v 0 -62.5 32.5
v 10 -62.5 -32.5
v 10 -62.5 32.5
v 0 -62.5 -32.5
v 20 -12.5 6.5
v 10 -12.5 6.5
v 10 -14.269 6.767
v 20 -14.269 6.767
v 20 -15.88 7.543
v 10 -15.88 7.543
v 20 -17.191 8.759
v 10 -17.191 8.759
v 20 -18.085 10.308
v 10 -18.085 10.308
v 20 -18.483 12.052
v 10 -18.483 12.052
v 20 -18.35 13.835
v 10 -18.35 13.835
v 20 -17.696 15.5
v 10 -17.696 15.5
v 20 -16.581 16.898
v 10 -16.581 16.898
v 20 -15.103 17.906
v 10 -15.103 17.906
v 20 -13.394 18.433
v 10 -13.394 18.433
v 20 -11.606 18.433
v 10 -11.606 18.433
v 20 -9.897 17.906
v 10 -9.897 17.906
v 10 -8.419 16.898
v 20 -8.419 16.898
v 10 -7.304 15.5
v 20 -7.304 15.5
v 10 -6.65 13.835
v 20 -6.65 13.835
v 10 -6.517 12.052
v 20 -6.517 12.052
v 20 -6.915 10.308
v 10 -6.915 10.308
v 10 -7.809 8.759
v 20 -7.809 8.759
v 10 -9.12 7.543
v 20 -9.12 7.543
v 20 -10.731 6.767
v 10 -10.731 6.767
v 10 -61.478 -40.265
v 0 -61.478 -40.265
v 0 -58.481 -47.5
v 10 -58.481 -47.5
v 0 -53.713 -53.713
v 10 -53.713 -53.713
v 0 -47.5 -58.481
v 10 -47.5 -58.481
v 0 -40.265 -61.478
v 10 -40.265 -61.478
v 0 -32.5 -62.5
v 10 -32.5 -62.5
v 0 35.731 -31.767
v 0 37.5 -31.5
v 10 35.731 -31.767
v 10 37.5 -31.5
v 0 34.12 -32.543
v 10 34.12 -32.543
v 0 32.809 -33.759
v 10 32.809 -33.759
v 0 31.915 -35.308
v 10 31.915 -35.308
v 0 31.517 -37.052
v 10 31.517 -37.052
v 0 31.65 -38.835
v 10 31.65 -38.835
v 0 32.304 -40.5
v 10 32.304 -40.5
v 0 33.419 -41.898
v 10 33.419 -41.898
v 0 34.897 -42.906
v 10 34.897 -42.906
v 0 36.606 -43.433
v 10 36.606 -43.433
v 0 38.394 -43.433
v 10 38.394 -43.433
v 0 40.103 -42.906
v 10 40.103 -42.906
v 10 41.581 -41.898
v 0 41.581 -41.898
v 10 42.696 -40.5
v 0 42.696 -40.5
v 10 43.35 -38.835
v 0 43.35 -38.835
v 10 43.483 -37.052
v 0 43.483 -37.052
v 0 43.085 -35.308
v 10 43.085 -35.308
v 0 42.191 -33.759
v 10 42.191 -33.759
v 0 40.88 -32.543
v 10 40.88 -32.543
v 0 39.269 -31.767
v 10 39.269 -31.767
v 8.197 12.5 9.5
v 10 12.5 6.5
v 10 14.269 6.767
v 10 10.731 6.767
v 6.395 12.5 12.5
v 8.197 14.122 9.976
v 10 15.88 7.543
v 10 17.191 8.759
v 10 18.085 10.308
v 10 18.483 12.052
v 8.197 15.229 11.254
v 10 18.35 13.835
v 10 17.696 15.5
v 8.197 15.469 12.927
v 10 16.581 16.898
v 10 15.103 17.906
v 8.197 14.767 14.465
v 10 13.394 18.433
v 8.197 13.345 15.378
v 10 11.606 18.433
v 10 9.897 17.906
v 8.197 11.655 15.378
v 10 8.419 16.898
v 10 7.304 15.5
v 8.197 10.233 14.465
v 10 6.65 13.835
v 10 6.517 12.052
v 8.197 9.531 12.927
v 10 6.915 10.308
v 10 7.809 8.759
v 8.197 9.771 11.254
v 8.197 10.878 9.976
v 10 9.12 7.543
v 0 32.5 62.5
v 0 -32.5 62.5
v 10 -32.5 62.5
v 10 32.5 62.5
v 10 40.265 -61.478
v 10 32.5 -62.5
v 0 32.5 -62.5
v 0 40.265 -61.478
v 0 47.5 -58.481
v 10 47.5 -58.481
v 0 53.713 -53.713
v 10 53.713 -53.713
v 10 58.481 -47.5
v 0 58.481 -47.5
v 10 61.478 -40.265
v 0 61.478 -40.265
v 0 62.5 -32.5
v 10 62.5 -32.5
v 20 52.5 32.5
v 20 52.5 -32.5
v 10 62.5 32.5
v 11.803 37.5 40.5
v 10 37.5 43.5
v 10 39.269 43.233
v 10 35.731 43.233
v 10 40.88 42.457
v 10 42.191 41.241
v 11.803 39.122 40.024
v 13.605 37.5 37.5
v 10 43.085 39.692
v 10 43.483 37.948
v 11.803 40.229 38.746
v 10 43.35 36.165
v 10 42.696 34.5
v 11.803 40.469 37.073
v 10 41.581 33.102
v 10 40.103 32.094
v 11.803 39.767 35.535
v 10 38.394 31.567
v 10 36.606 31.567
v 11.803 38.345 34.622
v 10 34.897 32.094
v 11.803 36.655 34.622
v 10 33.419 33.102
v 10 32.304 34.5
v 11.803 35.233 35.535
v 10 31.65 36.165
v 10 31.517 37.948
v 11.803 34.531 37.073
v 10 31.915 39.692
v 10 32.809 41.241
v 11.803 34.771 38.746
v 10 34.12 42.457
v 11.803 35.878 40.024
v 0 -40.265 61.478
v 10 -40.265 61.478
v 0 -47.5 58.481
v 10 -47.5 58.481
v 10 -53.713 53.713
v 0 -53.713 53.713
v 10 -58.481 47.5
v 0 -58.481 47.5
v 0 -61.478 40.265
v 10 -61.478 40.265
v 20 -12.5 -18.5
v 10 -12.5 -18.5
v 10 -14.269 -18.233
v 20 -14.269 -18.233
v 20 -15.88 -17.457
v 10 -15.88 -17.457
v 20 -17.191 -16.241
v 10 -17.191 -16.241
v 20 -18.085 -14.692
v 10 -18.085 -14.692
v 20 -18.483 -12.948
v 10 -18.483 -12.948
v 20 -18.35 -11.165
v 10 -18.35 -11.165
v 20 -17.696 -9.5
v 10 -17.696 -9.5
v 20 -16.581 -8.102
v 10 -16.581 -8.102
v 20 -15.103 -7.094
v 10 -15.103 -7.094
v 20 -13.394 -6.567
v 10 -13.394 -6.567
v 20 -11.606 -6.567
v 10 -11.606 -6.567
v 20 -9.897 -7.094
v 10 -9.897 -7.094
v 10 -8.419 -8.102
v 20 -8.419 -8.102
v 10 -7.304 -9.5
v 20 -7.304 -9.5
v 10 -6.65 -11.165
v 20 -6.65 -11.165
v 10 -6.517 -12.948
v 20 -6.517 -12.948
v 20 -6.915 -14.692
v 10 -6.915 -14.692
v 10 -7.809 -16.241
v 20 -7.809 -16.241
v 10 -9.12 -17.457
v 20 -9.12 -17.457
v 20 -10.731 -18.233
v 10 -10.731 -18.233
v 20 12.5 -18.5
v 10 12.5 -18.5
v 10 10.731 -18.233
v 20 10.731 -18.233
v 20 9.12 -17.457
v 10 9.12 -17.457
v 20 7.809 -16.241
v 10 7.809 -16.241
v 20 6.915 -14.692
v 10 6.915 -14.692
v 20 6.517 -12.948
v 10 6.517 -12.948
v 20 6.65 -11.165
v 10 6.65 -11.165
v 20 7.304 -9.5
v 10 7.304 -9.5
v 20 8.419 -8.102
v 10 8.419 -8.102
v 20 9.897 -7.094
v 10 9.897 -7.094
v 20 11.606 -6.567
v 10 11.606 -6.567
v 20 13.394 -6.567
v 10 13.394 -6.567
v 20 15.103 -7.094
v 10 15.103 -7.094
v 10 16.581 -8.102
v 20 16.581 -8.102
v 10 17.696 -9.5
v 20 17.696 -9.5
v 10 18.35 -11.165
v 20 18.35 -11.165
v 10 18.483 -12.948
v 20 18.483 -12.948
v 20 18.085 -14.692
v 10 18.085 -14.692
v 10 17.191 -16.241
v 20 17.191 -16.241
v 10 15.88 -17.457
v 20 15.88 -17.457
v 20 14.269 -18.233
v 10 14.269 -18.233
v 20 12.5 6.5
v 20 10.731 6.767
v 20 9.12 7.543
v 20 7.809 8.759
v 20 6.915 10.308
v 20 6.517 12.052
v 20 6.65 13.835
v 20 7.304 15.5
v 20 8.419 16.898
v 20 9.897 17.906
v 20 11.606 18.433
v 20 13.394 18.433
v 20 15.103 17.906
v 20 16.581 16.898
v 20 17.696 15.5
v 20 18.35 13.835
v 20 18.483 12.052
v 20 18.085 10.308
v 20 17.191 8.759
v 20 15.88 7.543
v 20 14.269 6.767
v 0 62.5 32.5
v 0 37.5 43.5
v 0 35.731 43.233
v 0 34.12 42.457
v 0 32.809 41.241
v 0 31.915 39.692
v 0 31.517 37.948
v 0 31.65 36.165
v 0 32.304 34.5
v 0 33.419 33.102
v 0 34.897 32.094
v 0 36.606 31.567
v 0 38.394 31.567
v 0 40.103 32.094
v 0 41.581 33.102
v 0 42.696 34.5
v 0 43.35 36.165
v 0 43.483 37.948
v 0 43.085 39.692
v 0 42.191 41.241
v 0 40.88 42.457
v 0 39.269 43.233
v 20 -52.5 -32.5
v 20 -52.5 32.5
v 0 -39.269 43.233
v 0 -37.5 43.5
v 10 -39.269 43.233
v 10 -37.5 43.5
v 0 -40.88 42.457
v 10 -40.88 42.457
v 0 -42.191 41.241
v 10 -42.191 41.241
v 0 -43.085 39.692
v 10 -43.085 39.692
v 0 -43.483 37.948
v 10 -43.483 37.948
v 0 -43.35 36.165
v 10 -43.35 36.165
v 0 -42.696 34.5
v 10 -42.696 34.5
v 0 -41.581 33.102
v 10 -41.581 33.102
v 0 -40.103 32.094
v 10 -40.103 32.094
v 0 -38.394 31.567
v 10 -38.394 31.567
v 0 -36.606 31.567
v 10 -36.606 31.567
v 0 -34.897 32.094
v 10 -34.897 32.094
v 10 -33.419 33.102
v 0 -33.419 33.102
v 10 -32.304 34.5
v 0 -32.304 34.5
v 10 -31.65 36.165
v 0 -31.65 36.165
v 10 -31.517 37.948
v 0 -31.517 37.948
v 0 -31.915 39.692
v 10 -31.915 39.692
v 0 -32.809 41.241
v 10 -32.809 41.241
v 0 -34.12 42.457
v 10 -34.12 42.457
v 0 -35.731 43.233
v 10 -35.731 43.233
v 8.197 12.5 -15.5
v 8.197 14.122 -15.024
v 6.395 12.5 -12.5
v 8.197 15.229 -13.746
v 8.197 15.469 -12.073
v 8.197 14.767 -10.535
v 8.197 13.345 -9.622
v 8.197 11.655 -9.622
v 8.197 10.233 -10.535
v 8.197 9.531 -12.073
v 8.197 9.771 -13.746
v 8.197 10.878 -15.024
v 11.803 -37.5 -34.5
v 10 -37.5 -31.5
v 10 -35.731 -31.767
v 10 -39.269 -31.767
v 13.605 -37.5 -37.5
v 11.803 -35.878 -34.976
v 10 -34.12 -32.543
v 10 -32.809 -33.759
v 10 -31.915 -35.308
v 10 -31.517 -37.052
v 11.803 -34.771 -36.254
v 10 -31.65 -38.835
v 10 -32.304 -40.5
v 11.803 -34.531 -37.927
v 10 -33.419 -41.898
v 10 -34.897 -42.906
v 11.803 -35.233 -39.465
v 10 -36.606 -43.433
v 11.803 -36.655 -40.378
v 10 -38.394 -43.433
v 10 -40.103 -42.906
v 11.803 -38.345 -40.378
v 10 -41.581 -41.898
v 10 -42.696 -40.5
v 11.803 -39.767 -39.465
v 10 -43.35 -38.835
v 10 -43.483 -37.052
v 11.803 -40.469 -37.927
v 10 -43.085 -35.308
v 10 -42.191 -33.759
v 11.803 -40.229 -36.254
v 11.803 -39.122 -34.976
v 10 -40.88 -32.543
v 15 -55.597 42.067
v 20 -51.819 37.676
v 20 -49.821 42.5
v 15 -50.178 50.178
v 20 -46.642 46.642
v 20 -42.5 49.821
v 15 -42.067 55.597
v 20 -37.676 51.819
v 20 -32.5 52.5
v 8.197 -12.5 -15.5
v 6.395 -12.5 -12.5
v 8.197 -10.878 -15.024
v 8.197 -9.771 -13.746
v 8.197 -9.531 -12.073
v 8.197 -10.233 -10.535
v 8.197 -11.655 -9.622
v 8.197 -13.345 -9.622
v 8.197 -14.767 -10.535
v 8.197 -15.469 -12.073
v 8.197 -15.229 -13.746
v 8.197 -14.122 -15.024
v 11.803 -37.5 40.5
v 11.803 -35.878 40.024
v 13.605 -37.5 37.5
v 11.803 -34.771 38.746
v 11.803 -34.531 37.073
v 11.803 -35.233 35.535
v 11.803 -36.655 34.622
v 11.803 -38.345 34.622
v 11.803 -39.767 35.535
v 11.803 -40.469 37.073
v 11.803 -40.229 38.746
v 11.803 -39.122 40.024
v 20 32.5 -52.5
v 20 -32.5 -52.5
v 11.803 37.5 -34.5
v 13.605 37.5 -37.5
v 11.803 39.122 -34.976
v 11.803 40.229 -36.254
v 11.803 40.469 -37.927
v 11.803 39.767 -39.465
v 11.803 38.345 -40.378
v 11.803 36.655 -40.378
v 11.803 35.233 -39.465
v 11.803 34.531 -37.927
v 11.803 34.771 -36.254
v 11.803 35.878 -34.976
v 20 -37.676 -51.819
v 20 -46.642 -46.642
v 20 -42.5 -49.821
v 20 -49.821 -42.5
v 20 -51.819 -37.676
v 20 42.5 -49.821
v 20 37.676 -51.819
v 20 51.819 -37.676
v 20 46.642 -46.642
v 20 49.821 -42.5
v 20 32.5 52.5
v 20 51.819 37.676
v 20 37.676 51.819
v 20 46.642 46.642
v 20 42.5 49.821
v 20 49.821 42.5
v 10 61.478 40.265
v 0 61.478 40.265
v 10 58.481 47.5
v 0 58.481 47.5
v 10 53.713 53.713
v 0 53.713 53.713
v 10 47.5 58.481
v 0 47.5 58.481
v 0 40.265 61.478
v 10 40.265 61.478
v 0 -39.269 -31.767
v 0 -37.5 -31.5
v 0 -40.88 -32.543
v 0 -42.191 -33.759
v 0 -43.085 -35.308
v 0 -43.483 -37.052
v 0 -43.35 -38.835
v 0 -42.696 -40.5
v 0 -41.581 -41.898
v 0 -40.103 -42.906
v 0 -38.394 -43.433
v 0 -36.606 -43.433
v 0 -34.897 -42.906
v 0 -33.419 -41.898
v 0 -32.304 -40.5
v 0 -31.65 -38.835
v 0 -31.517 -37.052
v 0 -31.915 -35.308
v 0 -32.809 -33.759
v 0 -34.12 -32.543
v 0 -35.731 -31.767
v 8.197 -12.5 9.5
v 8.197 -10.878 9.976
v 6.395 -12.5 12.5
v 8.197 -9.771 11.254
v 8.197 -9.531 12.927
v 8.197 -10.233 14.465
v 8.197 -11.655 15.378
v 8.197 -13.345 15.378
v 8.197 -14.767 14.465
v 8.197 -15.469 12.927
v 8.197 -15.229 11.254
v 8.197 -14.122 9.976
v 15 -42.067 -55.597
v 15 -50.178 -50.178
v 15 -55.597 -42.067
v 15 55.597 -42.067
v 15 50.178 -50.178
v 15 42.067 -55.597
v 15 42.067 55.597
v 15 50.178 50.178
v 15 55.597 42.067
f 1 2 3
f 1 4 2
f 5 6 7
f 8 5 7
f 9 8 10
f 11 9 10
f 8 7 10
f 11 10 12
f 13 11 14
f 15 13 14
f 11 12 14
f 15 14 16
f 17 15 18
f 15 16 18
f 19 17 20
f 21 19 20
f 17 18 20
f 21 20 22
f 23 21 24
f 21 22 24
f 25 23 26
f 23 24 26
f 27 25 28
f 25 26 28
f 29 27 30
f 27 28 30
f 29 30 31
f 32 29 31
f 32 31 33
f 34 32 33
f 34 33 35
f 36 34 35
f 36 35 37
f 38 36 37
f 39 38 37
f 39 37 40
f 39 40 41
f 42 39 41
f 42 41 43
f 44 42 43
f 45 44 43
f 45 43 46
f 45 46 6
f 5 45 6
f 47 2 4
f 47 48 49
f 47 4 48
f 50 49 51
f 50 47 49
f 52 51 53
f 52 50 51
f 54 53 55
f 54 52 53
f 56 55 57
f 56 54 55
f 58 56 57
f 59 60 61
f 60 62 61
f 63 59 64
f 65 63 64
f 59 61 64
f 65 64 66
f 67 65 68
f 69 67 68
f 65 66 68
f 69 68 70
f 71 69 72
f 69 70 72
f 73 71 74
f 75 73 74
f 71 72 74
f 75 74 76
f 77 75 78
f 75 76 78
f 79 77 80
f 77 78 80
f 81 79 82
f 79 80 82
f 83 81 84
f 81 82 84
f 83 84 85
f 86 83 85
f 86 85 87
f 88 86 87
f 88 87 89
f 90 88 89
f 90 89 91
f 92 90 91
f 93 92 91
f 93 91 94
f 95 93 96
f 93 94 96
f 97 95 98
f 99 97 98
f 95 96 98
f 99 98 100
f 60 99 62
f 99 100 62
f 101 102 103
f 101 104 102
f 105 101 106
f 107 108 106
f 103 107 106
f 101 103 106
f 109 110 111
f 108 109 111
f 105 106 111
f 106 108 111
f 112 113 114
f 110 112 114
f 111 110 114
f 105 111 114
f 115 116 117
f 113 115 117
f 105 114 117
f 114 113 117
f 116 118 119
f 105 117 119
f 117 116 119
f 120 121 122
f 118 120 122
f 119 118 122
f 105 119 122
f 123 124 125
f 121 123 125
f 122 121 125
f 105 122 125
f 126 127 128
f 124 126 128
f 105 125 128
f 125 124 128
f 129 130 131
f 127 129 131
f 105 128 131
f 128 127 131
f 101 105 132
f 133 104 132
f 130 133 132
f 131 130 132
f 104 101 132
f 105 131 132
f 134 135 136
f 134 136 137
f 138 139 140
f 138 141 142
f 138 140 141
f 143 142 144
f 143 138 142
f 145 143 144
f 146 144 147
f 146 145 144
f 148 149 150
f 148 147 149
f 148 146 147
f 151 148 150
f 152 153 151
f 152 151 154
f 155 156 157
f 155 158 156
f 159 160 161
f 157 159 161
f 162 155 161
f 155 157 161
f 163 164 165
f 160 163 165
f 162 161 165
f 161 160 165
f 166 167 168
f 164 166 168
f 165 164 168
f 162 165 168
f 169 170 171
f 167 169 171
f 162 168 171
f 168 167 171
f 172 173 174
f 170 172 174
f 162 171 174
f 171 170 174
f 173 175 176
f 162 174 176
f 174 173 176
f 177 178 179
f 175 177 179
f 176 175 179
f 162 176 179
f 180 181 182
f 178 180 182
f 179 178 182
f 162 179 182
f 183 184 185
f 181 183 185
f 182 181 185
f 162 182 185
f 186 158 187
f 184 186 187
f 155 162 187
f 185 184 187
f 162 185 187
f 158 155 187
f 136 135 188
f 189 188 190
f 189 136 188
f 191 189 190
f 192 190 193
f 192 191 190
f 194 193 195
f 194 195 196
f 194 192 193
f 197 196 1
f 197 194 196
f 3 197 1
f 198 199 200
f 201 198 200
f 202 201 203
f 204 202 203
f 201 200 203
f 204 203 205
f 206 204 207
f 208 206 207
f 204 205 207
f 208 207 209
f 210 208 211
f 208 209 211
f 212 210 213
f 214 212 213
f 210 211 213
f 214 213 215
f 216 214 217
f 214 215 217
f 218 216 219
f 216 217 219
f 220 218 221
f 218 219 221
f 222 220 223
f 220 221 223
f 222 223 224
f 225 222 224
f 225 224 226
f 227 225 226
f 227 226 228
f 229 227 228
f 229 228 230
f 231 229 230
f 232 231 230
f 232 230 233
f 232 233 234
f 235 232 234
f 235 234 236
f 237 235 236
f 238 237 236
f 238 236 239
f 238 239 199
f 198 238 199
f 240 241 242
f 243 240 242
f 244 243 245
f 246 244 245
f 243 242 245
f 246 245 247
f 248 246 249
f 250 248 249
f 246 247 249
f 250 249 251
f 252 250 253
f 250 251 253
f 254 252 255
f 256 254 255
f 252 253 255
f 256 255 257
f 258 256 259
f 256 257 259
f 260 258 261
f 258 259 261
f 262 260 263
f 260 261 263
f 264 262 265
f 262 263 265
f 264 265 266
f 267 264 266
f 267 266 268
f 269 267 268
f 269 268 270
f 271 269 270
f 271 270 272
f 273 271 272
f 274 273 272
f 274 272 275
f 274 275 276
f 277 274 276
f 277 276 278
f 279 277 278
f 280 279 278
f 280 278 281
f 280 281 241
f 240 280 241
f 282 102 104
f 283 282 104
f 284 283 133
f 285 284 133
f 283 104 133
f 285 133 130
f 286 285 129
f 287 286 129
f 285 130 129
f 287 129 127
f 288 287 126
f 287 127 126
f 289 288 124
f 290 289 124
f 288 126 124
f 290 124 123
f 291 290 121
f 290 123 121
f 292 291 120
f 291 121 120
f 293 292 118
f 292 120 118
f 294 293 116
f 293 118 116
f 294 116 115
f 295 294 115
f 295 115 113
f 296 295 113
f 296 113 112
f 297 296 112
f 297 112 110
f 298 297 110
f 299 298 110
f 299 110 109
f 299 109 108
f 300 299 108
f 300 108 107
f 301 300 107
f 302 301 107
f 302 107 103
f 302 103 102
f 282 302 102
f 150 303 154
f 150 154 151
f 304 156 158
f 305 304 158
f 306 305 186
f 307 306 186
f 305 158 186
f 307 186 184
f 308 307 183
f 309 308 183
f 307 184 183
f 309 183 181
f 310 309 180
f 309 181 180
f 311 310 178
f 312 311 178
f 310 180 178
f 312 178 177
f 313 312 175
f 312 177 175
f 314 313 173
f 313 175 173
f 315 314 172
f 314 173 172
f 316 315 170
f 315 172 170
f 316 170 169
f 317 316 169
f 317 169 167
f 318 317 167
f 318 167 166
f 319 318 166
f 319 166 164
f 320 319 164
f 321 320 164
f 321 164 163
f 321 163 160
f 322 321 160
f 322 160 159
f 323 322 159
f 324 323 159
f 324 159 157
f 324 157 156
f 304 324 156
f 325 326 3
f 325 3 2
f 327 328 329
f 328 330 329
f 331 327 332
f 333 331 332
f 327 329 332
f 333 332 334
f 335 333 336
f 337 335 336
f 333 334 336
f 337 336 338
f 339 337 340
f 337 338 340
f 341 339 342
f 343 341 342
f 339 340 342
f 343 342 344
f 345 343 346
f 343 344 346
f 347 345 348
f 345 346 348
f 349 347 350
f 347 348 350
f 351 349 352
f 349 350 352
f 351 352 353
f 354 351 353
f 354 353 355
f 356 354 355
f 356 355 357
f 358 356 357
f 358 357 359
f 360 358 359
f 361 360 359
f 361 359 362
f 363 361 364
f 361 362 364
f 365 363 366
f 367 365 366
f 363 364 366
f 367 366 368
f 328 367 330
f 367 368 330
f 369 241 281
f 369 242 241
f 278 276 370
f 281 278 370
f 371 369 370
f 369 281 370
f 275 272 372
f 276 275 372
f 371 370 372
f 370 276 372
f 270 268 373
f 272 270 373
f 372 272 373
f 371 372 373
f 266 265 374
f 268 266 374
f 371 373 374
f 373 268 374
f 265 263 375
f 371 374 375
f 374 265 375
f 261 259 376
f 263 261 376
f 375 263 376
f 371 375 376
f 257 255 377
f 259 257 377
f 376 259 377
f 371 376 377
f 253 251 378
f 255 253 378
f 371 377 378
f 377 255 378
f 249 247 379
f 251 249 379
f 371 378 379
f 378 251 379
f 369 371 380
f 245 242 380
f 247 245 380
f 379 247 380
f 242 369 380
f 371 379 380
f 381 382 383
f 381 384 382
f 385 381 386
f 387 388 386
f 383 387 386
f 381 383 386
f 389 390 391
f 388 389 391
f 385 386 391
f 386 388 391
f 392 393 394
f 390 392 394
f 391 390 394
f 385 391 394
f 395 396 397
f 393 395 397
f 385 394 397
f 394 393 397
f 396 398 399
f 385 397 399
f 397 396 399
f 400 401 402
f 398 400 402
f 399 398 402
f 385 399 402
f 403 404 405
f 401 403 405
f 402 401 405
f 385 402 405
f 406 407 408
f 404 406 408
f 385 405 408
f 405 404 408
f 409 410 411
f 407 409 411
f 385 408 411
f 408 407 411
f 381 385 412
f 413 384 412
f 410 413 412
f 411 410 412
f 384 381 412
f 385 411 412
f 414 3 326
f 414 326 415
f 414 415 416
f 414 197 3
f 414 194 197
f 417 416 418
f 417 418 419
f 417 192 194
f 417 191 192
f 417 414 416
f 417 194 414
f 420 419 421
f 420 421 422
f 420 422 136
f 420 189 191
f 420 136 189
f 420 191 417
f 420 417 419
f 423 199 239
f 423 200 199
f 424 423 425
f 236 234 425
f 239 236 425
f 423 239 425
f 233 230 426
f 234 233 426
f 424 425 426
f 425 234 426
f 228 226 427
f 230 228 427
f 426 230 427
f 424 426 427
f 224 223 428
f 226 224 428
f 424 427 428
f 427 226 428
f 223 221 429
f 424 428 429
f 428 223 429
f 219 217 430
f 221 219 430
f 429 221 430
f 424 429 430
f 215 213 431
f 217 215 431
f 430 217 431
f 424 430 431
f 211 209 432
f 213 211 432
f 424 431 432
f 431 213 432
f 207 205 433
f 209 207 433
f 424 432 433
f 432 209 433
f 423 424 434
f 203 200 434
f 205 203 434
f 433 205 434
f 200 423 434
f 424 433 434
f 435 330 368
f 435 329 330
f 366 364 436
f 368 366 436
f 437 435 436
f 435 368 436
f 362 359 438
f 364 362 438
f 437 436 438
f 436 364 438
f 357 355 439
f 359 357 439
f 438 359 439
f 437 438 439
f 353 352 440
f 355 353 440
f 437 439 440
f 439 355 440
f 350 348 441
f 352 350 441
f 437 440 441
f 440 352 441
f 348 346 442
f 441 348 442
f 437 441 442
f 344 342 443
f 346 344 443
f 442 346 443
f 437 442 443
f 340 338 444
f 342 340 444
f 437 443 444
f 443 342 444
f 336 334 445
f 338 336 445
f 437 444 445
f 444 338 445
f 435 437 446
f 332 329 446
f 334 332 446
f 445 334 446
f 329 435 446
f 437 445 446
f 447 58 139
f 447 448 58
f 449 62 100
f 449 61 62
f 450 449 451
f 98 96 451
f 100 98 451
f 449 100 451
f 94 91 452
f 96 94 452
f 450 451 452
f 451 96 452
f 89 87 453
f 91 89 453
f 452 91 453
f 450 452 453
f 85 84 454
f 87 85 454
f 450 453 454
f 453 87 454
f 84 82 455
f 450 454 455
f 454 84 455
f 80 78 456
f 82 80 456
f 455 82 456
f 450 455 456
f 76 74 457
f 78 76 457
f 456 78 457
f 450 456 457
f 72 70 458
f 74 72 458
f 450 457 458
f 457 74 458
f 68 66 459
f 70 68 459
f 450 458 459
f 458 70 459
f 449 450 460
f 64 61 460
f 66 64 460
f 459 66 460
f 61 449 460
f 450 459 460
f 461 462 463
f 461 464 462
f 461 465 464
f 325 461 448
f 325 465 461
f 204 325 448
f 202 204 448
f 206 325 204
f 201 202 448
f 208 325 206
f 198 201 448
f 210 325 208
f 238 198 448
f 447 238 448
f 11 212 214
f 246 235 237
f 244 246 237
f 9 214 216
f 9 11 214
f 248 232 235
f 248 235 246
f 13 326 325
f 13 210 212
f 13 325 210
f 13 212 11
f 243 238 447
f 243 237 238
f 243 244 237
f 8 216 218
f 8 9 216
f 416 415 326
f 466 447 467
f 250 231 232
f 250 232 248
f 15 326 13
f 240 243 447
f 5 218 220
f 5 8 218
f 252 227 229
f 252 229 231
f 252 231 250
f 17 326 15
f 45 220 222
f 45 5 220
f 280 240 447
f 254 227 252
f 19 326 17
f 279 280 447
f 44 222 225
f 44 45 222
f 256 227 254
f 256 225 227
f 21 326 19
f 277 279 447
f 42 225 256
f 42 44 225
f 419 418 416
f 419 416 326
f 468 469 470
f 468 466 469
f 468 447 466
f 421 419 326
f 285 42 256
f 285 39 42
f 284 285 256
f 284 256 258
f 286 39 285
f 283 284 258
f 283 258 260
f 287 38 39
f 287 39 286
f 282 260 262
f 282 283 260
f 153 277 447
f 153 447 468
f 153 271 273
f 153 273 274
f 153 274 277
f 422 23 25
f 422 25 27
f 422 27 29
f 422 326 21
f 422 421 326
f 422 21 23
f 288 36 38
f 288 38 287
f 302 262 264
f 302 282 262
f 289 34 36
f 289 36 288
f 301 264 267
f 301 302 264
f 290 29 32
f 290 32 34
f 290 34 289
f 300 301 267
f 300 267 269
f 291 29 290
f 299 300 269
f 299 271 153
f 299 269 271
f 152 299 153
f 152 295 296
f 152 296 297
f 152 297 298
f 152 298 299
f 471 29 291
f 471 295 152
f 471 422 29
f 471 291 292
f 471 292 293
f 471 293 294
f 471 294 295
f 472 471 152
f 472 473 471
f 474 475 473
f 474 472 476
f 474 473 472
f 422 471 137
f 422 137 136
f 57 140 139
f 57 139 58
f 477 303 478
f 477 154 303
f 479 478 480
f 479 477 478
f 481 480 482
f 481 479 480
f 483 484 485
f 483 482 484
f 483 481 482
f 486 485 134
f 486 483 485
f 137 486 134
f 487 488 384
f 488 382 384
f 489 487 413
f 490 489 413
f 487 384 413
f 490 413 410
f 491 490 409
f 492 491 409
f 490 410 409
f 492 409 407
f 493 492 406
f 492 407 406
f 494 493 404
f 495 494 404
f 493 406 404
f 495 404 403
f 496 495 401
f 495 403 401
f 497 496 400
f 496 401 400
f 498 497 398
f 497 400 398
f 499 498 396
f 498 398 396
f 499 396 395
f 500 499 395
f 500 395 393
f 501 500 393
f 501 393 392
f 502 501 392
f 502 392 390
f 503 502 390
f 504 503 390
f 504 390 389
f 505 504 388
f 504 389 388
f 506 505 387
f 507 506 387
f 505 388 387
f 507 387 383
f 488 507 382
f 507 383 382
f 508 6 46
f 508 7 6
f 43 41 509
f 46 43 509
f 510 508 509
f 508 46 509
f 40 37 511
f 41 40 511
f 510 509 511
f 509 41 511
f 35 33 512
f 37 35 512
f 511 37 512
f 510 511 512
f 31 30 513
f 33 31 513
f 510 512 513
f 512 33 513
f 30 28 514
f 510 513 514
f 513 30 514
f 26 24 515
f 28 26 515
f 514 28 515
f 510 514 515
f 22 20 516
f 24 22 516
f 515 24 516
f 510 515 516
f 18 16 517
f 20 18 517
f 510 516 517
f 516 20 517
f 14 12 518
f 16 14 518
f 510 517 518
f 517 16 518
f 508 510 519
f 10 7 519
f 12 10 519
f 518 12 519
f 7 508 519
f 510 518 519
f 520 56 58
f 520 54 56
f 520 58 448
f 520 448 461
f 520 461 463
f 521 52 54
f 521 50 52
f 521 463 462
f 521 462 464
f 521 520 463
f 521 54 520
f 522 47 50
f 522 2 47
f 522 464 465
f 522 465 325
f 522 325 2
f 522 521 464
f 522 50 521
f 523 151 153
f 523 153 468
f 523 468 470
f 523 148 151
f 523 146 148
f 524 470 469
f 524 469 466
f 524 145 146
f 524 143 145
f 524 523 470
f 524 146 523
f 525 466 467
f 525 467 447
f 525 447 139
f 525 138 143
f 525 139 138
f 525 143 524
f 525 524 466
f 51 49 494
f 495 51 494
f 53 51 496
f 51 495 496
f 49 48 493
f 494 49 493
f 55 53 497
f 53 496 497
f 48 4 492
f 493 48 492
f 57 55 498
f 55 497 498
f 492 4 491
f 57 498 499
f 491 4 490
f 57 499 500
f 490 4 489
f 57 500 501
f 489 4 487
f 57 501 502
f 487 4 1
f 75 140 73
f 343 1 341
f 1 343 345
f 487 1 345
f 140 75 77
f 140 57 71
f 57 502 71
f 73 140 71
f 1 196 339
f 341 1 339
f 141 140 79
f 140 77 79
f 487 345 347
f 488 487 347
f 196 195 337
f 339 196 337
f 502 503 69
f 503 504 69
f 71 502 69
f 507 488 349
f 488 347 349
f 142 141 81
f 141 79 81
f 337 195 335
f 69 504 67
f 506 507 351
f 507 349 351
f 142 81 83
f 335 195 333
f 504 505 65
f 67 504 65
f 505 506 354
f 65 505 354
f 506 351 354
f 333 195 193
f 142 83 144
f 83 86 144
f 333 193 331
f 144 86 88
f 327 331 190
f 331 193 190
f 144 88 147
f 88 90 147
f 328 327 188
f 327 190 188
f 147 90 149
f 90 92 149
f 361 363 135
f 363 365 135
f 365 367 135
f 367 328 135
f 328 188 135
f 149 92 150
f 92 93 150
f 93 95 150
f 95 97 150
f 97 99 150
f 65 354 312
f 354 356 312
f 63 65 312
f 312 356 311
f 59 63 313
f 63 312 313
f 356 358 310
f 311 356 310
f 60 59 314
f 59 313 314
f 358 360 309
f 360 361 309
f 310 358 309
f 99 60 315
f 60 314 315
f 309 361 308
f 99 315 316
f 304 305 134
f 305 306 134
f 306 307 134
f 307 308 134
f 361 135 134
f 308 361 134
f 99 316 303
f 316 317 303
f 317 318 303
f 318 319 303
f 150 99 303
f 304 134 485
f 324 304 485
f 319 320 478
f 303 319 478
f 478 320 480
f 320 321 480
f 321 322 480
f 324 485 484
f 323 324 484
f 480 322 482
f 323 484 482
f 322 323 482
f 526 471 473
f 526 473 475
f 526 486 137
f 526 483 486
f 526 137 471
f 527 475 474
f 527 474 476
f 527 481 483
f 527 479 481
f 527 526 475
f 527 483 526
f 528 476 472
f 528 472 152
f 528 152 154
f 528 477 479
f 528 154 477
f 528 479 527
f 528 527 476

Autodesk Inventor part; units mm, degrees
ref_plane "YZ Plane" through (0, 0, 0) normal (1, 0, 0) x (0, 1, 0)
ref_plane "XZ Plane" through (0, 0, 0) normal (0, 1, 0) x (-1, 0, 0)
ref_plane "XY Plane" through (0, 0, 0) normal (0, 0, 1) x (1, 0, 0)
sketch "草圖1" plane through (0, 0, 0) normal (1, 0, 0) x (0, 1, 0)
  line L0 (-62.5, 62.5) -> (62.5, 62.5)
  line L1 (62.5, 62.5) -> (62.5, -62.5)
  line L2 (62.5, -62.5) -> (-62.5, -62.5)
  line L3 (-62.5, -62.5) -> (-62.5, 62.5)
  line L4 (-62.5, 62.5) -> (62.5, -62.5) construction
  line L5 (62.5, 62.5) -> (-62.5, -62.5) construction
  point P0 (0, 0)
  dimension "d0" = 125
  dimension "d1" = 125
extrude "擠出1" add sketch "草圖1" along normal blind 20
fillet "圓角1" radius 30 4 edges at (10, 62.5, 62.5) (10, -62.5, 62.5) (10, 62.5, -62.5) (10, -62.5, -62.5)
chamfer "倒角1" distance 10 angle 45 8 edges at (20, 0, 62.5) (20, -53.7132, 53.7132) (20, -62.5, 0) (20, -53.7132, -53.7132) (20, 0, -62.5) (20, 53.7132, -53.7132) (20, 62.5, 0) (20, 53.7132, 53.7132)
sketch "草圖2" plane through (20, 0, 0) normal (1, 0, 0) x (0, 0, -1)
  line L0 (-12.5, -12.5) -> (12.5, -12.5)
  line L1 (12.5, -12.5) -> (12.5, 12.5)
  line L2 (12.5, 12.5) -> (-12.5, 12.5)
  line L3 (-12.5, 12.5) -> (-12.5, -12.5)
  line L4 (-12.5, -12.5) -> (12.5, 12.5) construction
  line L5 (12.5, -12.5) -> (-12.5, 12.5) construction
  point P0 (0, 0)
  dimension "d8" = 25
  dimension "d9" = 25
hole "孔1" at (20, 12.5, 12.5) at (20, 12.5, -12.5) at (20, -12.5, 12.5) at (20, -12.5, -12.5) direction (-1, 0, 0) diameter 12 depth 10 tip angle 118
sketch "草圖3" plane through (0, 0, 0) normal (-1, 0, 0) x (0, 0, 1)
  arc A0 (-62.5, -32.5) -> (-32.5, -62.5) centre (-32.5, -32.5) ccw projected
  line L0 (-32.5, -62.5) -> (32.5, -62.5) projected
  arc A1 (32.5, -62.5) -> (62.5, -32.5) centre (32.5, -32.5) ccw projected
  line L1 (62.5, -32.5) -> (62.5, 32.5) projected
  arc A2 (62.5, 32.5) -> (32.5, 62.5) centre (32.5, 32.5) ccw projected
  line L2 (32.5, 62.5) -> (-32.5, 62.5) projected
  arc A3 (-32.5, 62.5) -> (-62.5, 32.5) centre (-32.5, 32.5) ccw projected
  line L3 (-62.5, 32.5) -> (-62.5, -32.5) projected
  line L4 (37.5, 37.5) -> (-37.5, 37.5)
  line L5 (-37.5, 37.5) -> (-37.5, -37.5)
  line L6 (-37.5, -37.5) -> (37.5, -37.5)
  line L7 (37.5, -37.5) -> (37.5, 37.5)
  line L8 (37.5, 37.5) -> (-37.5, -37.5) construction
  line L9 (-37.5, 37.5) -> (37.5, -37.5) construction
  point P0 (0, 0)
  dimension "d17" = 75
  dimension "d18" = 75
hole "孔2" at (0, -37.5, 37.5) at (0, -37.5, -37.5) at (0, 37.5, -37.5) at (0, 37.5, 37.5) direction (1, 0, 0) diameter 12 depth 10 tip angle 118
properties part number "exercise3-1-5"
